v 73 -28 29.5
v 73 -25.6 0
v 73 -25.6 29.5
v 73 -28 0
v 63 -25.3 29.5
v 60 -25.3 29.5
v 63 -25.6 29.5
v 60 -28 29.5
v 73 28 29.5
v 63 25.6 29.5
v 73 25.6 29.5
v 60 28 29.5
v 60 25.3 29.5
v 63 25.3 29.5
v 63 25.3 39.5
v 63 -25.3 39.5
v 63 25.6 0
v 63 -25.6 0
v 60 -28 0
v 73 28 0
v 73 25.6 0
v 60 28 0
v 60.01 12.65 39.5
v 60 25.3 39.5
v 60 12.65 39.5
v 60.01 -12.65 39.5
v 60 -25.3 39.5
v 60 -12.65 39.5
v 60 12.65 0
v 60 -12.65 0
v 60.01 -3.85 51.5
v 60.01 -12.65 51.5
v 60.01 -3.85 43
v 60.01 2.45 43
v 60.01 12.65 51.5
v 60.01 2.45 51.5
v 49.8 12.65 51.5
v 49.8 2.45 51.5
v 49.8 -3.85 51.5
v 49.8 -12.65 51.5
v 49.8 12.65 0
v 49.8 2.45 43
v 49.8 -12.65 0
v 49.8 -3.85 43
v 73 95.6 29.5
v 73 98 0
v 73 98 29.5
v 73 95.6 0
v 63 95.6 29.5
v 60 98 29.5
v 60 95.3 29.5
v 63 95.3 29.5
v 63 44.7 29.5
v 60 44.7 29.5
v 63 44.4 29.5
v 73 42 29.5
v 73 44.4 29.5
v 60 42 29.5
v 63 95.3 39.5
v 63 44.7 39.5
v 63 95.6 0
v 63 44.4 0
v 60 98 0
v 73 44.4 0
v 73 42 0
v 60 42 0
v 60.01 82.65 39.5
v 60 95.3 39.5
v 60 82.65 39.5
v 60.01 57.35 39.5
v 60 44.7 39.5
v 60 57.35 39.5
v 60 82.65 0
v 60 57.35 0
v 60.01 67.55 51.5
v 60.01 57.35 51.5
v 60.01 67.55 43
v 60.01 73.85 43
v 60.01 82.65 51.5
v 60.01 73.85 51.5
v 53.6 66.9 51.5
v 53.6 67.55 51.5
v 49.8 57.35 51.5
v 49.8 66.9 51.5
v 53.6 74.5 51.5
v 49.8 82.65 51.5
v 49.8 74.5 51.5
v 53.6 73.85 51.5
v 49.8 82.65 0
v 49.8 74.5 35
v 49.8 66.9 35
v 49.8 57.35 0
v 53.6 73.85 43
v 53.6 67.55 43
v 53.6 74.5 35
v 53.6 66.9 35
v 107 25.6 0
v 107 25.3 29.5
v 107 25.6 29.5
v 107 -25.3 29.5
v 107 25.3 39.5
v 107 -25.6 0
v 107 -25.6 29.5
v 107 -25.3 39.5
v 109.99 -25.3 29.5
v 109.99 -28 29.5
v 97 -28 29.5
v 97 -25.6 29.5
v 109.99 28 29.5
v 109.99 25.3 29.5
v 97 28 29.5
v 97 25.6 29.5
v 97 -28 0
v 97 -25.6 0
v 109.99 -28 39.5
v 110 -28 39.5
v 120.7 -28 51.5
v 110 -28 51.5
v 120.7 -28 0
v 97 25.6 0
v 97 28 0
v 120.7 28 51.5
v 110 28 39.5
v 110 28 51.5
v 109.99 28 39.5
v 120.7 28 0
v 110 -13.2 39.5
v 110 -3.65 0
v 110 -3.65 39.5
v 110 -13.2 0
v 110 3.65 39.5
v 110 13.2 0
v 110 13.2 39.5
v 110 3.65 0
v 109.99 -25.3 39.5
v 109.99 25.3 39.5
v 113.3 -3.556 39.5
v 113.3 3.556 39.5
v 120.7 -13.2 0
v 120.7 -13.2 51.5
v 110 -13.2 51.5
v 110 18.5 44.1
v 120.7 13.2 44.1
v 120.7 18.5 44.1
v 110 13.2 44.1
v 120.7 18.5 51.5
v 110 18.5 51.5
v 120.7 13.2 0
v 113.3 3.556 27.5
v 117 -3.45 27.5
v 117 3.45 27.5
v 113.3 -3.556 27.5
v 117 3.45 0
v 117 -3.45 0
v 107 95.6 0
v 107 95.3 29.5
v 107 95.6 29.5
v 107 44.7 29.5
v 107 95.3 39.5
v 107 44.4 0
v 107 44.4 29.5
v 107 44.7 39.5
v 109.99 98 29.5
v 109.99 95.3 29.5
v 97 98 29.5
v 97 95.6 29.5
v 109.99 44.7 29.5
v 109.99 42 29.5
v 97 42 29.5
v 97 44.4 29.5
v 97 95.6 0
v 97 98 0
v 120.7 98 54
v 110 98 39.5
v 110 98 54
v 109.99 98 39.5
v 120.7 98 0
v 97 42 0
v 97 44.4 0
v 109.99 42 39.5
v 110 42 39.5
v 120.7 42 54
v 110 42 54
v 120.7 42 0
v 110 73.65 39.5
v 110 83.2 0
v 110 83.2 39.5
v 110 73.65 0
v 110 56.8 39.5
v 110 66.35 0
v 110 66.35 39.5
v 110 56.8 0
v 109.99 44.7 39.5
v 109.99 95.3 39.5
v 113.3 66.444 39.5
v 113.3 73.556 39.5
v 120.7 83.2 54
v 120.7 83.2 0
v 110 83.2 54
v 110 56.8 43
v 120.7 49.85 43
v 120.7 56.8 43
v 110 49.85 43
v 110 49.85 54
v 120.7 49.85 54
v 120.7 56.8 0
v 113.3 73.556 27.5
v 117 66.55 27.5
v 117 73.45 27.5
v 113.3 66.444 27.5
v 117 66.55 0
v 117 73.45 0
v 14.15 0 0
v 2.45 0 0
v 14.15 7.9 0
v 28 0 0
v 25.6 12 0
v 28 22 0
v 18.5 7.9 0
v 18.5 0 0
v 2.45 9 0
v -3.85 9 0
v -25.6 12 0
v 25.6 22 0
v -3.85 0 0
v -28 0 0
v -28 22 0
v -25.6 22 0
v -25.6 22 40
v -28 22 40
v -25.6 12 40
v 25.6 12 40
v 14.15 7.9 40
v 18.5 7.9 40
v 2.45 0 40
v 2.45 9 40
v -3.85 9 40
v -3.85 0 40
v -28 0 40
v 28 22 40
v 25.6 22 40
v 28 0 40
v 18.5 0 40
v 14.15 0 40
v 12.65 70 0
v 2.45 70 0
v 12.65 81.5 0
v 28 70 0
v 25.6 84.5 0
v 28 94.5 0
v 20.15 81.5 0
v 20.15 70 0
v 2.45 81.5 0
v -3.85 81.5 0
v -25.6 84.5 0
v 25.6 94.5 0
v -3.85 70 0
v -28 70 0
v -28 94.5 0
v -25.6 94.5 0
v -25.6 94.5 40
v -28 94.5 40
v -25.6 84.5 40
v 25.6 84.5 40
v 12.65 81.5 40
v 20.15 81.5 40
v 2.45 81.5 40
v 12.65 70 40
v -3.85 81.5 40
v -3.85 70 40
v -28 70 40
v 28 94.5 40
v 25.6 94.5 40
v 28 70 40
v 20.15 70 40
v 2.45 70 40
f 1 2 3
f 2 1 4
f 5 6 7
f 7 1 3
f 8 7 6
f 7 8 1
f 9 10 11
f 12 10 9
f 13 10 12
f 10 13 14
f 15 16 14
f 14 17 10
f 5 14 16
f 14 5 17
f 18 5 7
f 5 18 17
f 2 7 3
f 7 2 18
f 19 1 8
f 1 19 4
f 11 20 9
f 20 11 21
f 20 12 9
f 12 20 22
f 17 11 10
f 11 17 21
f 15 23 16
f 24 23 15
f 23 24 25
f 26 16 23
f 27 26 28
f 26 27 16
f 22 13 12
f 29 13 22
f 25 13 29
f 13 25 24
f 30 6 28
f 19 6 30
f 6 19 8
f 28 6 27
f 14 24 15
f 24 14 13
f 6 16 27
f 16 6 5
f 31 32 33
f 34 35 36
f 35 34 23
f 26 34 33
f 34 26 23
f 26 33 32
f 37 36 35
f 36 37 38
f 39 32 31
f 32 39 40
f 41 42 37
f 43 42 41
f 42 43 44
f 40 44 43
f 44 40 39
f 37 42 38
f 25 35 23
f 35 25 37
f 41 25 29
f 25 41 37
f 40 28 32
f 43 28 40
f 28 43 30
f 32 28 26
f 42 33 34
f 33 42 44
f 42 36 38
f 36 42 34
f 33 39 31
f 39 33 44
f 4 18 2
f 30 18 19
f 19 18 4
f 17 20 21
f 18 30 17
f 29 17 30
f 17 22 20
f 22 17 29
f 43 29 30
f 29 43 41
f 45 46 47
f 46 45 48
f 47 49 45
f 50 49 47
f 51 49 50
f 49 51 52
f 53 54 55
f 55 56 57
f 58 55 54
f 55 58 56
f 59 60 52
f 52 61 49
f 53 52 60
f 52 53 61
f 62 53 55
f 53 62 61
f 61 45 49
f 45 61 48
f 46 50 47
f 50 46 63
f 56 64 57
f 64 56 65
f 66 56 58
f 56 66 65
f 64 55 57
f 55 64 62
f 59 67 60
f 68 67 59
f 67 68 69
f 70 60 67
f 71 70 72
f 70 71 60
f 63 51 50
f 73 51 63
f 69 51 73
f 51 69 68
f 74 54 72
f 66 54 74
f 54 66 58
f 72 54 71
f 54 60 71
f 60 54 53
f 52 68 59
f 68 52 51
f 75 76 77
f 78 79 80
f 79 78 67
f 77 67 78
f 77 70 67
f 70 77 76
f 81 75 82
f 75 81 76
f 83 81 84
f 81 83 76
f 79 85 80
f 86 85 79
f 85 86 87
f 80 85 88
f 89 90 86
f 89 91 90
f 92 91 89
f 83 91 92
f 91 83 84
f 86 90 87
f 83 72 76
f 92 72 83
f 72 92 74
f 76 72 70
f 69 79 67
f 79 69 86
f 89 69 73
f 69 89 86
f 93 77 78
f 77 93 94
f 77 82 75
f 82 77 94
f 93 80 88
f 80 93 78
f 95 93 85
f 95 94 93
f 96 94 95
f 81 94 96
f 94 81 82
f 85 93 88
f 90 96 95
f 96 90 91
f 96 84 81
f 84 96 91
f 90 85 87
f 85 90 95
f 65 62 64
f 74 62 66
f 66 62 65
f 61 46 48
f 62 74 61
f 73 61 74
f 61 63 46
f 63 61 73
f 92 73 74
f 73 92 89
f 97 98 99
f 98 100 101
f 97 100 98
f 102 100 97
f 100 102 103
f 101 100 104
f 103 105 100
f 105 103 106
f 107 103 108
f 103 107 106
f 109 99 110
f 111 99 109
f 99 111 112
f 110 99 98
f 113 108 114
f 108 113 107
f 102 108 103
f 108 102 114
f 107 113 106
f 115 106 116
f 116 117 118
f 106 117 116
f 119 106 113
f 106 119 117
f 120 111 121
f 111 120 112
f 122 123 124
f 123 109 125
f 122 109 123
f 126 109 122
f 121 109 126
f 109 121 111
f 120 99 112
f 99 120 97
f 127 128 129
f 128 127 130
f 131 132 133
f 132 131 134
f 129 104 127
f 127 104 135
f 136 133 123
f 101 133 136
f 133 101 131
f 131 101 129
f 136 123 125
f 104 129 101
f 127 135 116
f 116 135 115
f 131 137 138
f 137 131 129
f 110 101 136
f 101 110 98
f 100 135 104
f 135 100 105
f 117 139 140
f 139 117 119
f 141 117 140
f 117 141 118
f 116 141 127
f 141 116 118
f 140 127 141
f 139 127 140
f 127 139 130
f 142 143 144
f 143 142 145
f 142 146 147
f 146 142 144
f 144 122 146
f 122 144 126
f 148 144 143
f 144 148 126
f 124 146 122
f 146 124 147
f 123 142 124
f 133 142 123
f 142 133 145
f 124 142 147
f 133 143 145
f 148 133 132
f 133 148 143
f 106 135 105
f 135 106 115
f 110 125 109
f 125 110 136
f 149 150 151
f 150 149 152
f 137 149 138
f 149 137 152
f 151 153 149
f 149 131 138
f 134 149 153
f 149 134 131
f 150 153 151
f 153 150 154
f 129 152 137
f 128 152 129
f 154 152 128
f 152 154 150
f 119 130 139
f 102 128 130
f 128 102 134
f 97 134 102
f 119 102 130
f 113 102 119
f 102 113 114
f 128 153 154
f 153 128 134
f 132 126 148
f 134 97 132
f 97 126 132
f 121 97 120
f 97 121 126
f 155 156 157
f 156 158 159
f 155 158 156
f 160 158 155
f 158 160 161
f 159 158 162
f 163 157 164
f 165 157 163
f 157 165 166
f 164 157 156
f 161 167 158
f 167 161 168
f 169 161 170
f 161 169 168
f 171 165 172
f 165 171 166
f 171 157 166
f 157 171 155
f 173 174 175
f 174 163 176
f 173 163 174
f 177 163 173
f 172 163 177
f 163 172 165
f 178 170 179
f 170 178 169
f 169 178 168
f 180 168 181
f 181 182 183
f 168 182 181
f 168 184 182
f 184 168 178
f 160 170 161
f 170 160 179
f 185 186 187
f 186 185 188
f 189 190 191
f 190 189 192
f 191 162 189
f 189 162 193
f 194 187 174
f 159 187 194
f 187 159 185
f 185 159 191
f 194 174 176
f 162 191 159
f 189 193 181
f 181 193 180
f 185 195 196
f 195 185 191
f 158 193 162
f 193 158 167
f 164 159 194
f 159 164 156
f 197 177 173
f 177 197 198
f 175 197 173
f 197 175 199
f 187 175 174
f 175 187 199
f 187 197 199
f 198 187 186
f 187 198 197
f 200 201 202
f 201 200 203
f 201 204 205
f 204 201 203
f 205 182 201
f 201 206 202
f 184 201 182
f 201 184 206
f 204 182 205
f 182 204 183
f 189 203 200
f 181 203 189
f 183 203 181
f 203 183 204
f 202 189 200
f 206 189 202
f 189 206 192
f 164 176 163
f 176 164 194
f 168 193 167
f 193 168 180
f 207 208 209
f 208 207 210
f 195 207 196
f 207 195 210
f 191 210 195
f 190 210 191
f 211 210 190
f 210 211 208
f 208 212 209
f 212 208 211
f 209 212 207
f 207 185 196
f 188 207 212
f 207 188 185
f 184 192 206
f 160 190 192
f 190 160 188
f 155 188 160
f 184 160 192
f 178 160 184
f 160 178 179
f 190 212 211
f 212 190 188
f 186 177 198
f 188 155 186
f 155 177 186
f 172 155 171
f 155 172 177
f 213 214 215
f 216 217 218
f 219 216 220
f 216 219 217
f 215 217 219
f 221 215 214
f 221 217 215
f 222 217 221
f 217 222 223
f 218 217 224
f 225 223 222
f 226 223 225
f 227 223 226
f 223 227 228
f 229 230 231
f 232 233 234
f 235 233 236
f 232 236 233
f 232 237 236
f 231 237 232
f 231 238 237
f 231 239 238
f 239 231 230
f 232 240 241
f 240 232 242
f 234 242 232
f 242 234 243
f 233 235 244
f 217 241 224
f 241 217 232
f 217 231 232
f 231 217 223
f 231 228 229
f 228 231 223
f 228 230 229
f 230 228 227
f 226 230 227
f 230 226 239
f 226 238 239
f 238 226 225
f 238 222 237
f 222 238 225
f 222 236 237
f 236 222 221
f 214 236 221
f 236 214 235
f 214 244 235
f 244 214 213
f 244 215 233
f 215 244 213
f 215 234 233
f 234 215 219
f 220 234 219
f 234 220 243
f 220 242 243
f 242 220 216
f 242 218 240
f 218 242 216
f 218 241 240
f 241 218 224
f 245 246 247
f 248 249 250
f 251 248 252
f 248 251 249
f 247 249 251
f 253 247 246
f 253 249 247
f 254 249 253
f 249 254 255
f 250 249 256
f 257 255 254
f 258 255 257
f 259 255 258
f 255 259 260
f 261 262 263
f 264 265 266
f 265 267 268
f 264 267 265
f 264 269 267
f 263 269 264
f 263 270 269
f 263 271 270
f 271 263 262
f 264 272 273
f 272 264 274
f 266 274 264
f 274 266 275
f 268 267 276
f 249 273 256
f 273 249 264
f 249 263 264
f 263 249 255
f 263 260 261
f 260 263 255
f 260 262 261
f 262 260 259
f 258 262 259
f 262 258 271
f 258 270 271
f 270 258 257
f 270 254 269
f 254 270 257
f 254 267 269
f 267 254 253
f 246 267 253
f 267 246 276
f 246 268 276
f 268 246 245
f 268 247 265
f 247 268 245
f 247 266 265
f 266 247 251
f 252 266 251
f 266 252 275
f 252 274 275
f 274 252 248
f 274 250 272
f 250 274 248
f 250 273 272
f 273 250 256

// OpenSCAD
// =====================================================================
//  Window vent: printed edge caps around the foam insert (fit tests)
//  Parametric OpenSCAD model (tested with OpenSCAD 2021.01).
//
//  * The foam insert (XPS, 2 in thick, 100 mm wide) fills the gap
//    between the sliding sash and the window's side frame. Printed caps
//    on its four edges fit the window's profiles, so the foam itself
//    stays a plain rectangle:
//      - top:    over the top frame's two ribs;
//      - bottom: over the bottom track's two rails;
//      - side:   a tongue into the side frame's sash channel;
//      - sash:   a channel that takes the sash's end, as the side frame
//                does, with a tongue in the sash's end groove.
//  * This first step prints a thin slice of each profile, to check the
//    profiles and the clearance before printing whole caps. The second
//    prints the cap ends that meet in the four corners.
//  * Installation, like a drawer: open the sash wide; push the side cap
//    into the side frame's channel; set the bottom and top caps on their
//    rails and ribs a little away from the side frame and slide them
//    against it; slide the foam in sideways, between their lips, into
//    the side cap; put the sash cap on the foam's other edge; close the
//    sash against it. Nothing is glued: reverse it in spring.
//  * The top and bottom caps run the whole width, from the side frame's
//    face to the sash's end. The side and sash caps fit between them,
//    and the top and bottom caps' lips straddle their ends. The side
//    cap's tongue goes on into the channel up to the ceiling and down to
//    the floor, notched for the centre rib and rail (they run through
//    the channel to its back wall) and for the soft foam strip there.
//
//  Slices: x across the foam's thickness (u, from its centre, outdoor
//  negative), y from the window's reference surface toward the foam
//  (the ceiling, the track floor, the side frame's face or the sash's
//  end face), z through the slice. The window's features are at y < 0
//  for the side and the sash, and cut into the slice from y = 0 for the
//  top and the bottom.
//
//  Caps, installed: x across the window (x = 0 on the side frame's face,
//  toward the sash), y = u, z up (z = 0 on the track's floor).
//
//  Each slice ends in a tab exactly as wide as the foam: its edges show
//  where the foam's faces are, and the engraved line across it shows
//  where the foam starts. The tabs carry a cross-lap key: in a corner, a
//  top or bottom slice and a side or sash slice slot together (sliding
//  along u until both slots bottom out), so their u positions must
//  match for the pair to sit in the corner.
// =====================================================================

/* [Part to show or export] */
part = "corners";   // [corners, corner_top, corner_bottom, corner_side_top, corner_side_bottom, corner_sash_top, corner_sash_bottom, corners_view, slices, slice_top, slice_bottom, slice_side, slice_sash, slice_pair_view]

/* [Fit] */
clr      = 0.3;     // clearance per side on the window's ribs, channel and sash
clr_d    = 0.5;     // clearance at the bottom of a slot or channel (depth)
slice_t  = 5;       // slice thickness
base     = 3;       // cap material between the deepest window feature and the foam

cap_gap  = 0.5;     // between a cap's end and the cap it butts against (foam tape)
foam_clr = 0.2;     // per side, between the foam and the lips (it slides in)

/* [Foam] */
foam_t   = 50.8;    // foam thickness (2 in)
foam_w   = 100;     // foam width, side frame to sash

/* [Caps] */
lip_d    = 10;      // how far the lips reach onto the foam's faces
lip_t    = 2.4;     // lip thickness
corner_l = 40;      // corner test pieces: length past the cap they butt against

/* [Window (measured)] */
H        = 1079.5;  // ceiling to floor: 1060.0 from the centre rib's tip to the centre rail's tip, + 8.50 + 11.00
// u positions are measured from the foam's centre: the centre of the 25.90 sash channel. The first rib of each
// list is the centre one (the sash rides it; it runs through the side frame's channel to its back wall)
top_ribs = [[-3.55, 2.15, 8.50], [14.45, 18.20, 7.40]];    // [u from, u to, depth below the ceiling]; the third rib
                                                           //   (-39.85 to -34.55) is outside the foam. The room-side
                                                           //   rib is 1.5 mm further toward the room than the bottom
                                                           //   track's (measured twice)
bot_ribs = [[-3.55, 2.15, 11.00], [12.95, 19.85, 11.00]];  // [u from, u to, height above the floor]; the tall
                                                           //   outdoor lip (-39.50 to -33.80) is outside the foam
side_ch  = [25.90, 10.70];  // side frame's sash channel: width (centred), depth
strip    = [-4.20, 2.80, 19.0, 4.0];   // soft foam strip around the centre rail's end, at the back of the channel:
                    //   u from, u to, height, depth from the back wall
floor_strip = 2.5;  // the tongue stops this much higher, over another soft strip on the channel's floor
                    //   (1.7 thick, 4.0 deep from the back wall, across the channel)
sash_t   = 25.80;   // sash thickness at its end (centred)
sash_in  = 10.70;   // how far the sash goes into its cap (17.10 max: there the sash widens)
groove   = [7.90, 7.50, 7.50];   // sash end groove: width at the mouth, width at the bottom, depth
groove_key = true;  // tongue in the sash's end groove (one more seal line)
screw    = [3.70, 12];   // screw heads in the groove at the sash's top and bottom: height above the groove's bottom,
                         //   length of the tongue's relief from each of its ends

/* [Key] */
key_at   = 25;      // key position from the window's reference surface (clear of the deepest cap)
key_clr  = 0.15;    // clearance per side in the key slots
key_tail = 4;       // tab material past the key slot

eps   = 0.01;
key_w = slice_t + 2 * key_clr;
tab_y = key_at + key_w / 2 + key_tail;   // tab end

// foam line: cap thickness from the reference surface to the foam
function deepest(r) = max([for (i = r) i[2]]);
function cap_t(kind) =
    kind == "top"    ? deepest(top_ribs) + clr_d + base :
    kind == "bottom" ? deepest(bot_ribs) + clr_d + base : base;

// the slice's outline, 2D
module profile(kind) {
    w = foam_t;
    if (kind == "top" || kind == "bottom")
        difference() {
            translate([-w / 2, 0]) square([w, tab_y]);
            for (r = kind == "top" ? top_ribs : bot_ribs)
                translate([r[0] - clr, -1]) square([r[1] - r[0] + 2 * clr, r[2] + clr_d + 1]);
        }
    if (kind == "side")
        union() {
            translate([-w / 2, 0]) square([w, tab_y]);
            translate([-side_ch[0] / 2 + clr, -(side_ch[1] - clr_d)]) square([side_ch[0] - 2 * clr, side_ch[1] - clr_d + eps]);
        }
    if (kind == "sash")
        union() {
            translate([-w / 2, 0]) square([w, tab_y]);
            for (s = [-1, 1])   // the channel's walls, along the sash's faces
                translate([s < 0 ? -w / 2 : sash_t / 2 + clr, -sash_in]) square([w / 2 - sash_t / 2 - clr, sash_in + eps]);
            if (groove_key) {   // tongue in the groove, tapered like it
                m = groove[0] / 2 - clr;
                b = groove[1] / 2 - clr;
                d = groove[2] - clr_d;
                polygon([[-m, eps], [m, eps], [b, -d], [-b, -d]]);
            }
        }
}

module label(t, size = 4) text(t, size = size, font = "Liberation Sans:style=Bold", halign = "center", valign = "center");

// one slice, on the bed
module slice(kind) {
    w  = foam_t;
    t  = cap_t(kind);
    tb = kind == "top" || kind == "bottom";
    name = kind == "top" ? "TOP" : kind == "bottom" ? "BOT" : kind == "side" ? "SIDE" : "SASH";
    difference() {
        linear_extrude(slice_t) profile(kind);
        // key slot: from the outdoor edge on the top and bottom slices, from the room edge on the side and sash ones
        translate([tb ? -w / 2 - 1 : 0, key_at - key_w / 2, -1]) cube([w / 2 + 1, key_w, slice_t + 2]);
        // foam line: an engraved line across, and a notch in each edge
        translate([-w / 2 - 1, t - 0.3, slice_t - 0.4]) cube([w + 2, 0.6, 1]);
        for (s = [-1, 1]) translate([s * w / 2, t, -1]) rotate(45) translate([-0.8, -0.8, 0]) cube([1.6, 1.6, slice_t + 2]);
        // foam centre line, on the tab
        translate([-0.3, t, slice_t - 0.4]) cube([0.6, tab_y - t + 1, 1]);
        // labels, between the foam line and the key slot
        ly = (t + key_at - key_w / 2) / 2;
        translate([-w / 4 - 2, ly, slice_t - 0.6]) linear_extrude(1) label("OUT");
        translate([w / 4 + 1, ly, slice_t - 0.6]) linear_extrude(1) label(name);
    }
}

// all four slices, laid out for one print
module slices() {
    for (k = [["top", 0, 0], ["bottom", 1, 0], ["side", 0, 1], ["sash", 1, 1]])
        translate([k[1] * (foam_t + 8), k[2] * (tab_y + sash_in + 8) + (k[0] == "side" || k[0] == "sash" ? sash_in : 0), 0])
            slice(k[0]);
}

// a keyed pair in its corner: top slice and side slice, installed coordinates (x across the window toward the foam,
// y = u toward the room, z up; the ceiling at z = 0, the side frame's face at x = 0). The window is a rough ghost.
module slice_pair_view() {
    color([0.95, 0.6, 0.25])   // slice u -> y, depth below the ceiling -> -z, thickness -> -x
        multmatrix([[0, 0, -1, key_at + slice_t / 2], [1, 0, 0, 0], [0, -1, 0, 0], [0, 0, 0, 1]]) slice("top");
    color([0.4, 0.6, 0.9])     // slice u -> y, distance from the frame's face -> x, thickness -> -z
        multmatrix([[0, 1, 0, 0], [1, 0, 0, 0], [0, 0, -1, -key_at + slice_t / 2], [0, 0, 0, 1]]) slice("side");
    %union() {
        translate([-side_ch[1] - 8, -45, 0]) cube([side_ch[1] + 8 + 70, 90, 6]);   // top frame
        for (r = top_ribs) translate([0, r[0], -r[2]]) cube([70, r[1] - r[0], r[2] + eps]);
        difference() {   // side frame, with its sash channel
            translate([-side_ch[1] - 8, -45, -70]) cube([side_ch[1] + 8, 90, 70]);
            translate([-side_ch[1], -side_ch[0] / 2, -71]) cube([side_ch[1] + 1, side_ch[0], 72]);
        }
    }
}

/* =================== CAPS (installed coordinates) =================== */
fw = foam_t / 2 + foam_clr;     // half width inside the lips
ow = fw + lip_t;                // half width over the lips
xs = base + foam_w + base;      // the sash's end face
zt = H - cap_t("top");          // underside of the top cap's body
zb = cap_t("bottom");           // top of the bottom cap's body

// top or bottom cap's cross-section: X = u, Y = from the ceiling or floor toward the foam
module cap_section(kind) {
    t = cap_t(kind);
    difference() {
        translate([-ow, 0]) square([2 * ow, t]);
        for (r = kind == "top" ? top_ribs : bot_ribs)
            translate([r[0] - clr, -1]) square([r[1] - r[0] + 2 * clr, r[2] + clr_d + 1]);
    }
    for (s = [-1, 1]) translate([s < 0 ? -ow : fw, t - eps]) square([lip_t, lip_d + eps]);
}

module top_cap(x0 = 0, x1 = xs) {
    multmatrix([[0, 0, 1, x0], [1, 0, 0, 0], [0, -1, 0, H], [0, 0, 0, 1]]) linear_extrude(x1 - x0) cap_section("top");
}

module bottom_cap(x0 = 0, x1 = xs) {
    multmatrix([[0, 0, 1, x0], [1, 0, 0, 0], [0, 1, 0, 0], [0, 0, 0, 1]]) linear_extrude(x1 - x0) cap_section("bottom");
}

// the side and sash caps' bodies and lips, between the top and bottom caps (and under their lips)
// (the base is the foam's width at its ends, where those lips straddle it, and the lips' width between them)
module upright_body(xb0, xl0) {
    translate([xb0, -fw + clr, zb + cap_gap]) cube([base, 2 * (fw - clr), zt - zb - 2 * cap_gap]);
    z0 = zb + lip_d + cap_gap;
    h  = zt - zb - 2 * (lip_d + cap_gap);
    translate([xb0, -ow, z0]) cube([base, 2 * ow, h]);
    for (s = [-1, 1])
        translate([xl0, s < 0 ? -ow : fw, z0]) cube([lip_d, lip_t, h]);
}

module side_cap() {
    upright_body(0, base);
    tw = side_ch[0] / 2 - clr;
    td = side_ch[1] - clr_d;
    difference() {   // tongue, floor to ceiling in the channel
        translate([-td, -tw, clr_d + floor_strip]) cube([td + eps, 2 * tw, H - 2 * clr_d - floor_strip]);
        r = top_ribs[0];
        translate([-td - 1, r[0] - clr, H - r[2] - clr_d]) cube([td + 2, r[1] - r[0] + 2 * clr, r[2] + clr_d + 1]);
        b = bot_ribs[0];
        translate([-td - 1, b[0] - clr, -1]) cube([td + 2, b[1] - b[0] + 2 * clr, b[2] + clr_d + 1]);
        translate([-side_ch[1] - 1, strip[0] - clr, -1]) cube([strip[3] + clr + 1, strip[1] - strip[0] + 2 * clr, strip[2] + clr_d + 1]);
    }
}

module sash_cap() {
    upright_body(xs - base, xs - base - lip_d);
    z0 = zb + cap_gap;
    h  = zt - zb - 2 * cap_gap;
    wi = sash_t / 2 + clr;   // the walls' inner face (|u|)
    for (s = [-1, 1]) {   // the channel's walls, along the sash's faces
        translate([xs - eps, s < 0 ? -ow : wi, z0]) cube([sash_in + eps, ow - wi, h]);
        // past the sash's end face they go on to the ceiling and the floor, notched for the ribs and rails beside
        // the sash (a notch runs to the sash's face when it would leave a sliver thinner than 1.5 mm)
        difference() {
            translate([xs, s < 0 ? -ow : wi, clr_d]) cube([sash_in, ow - wi, H - 2 * clr_d]);
            for (k = [[top_ribs, H, -1], [bot_ribs, 0, 1]], r = k[0])
                let(a = r[0] - clr, b = r[1] + clr)
                if (s * b > wi && s * a < ow)
                    let(lo = s > 0 && a - wi < 1.5 ? wi - 1 : a,
                        hi = s < 0 && -wi - b < 1.5 ? -wi + 1 : b,
                        d  = r[2] + clr_d)
                    translate([xs - 1, lo, k[2] > 0 ? -1 : H - d]) cube([sash_in + 2, hi - lo, d + 1]);
        }
    }
    if (groove_key) {   // tongue in the groove, tapered like it
        m = groove[0] / 2 - clr;
        b = groove[1] / 2 - clr;
        d = groove[2] - clr_d;
        difference() {
            translate([xs, 0, z0]) linear_extrude(h) polygon([[-eps, -m], [-eps, m], [d, b], [d, -b]]);
            for (zr = [z0 - 1, z0 + h - screw[1]])   // shallower over the screw heads near its ends
                translate([xs + groove[2] - screw[0] - clr_d, -groove[0], zr]) cube([screw[0] + 1, 2 * groove[0], screw[1] + 1]);
        }
    }
}

// the window around the caps, roughly (a ghost for the views)
module window_ghost() {
    x0 = -side_ch[1] - 8;
    x1 = xs + 40;
    translate([x0, -45, H]) cube([x1 - x0, 90, 6]);   // top frame and its ribs
    for (r = top_ribs) let(a = r == top_ribs[0] ? -side_ch[1] : 0) translate([a, r[0], H - r[2]]) cube([x1 - a, r[1] - r[0], r[2] + eps]);
    translate([x0, -45, -6]) cube([x1 - x0, 90, 6]);  // bottom frame and its rails
    for (r = bot_ribs) let(a = r == bot_ribs[0] ? -side_ch[1] : 0) translate([a, r[0], -eps]) cube([x1 - a, r[1] - r[0], r[2] + eps]);
    translate([-side_ch[1], strip[0], 0]) cube([strip[3], strip[1] - strip[0], strip[2]]);
    difference() {   // side frame, with its channel
        translate([x0, -45, 0]) cube([8 + side_ch[1], 90, H]);
        translate([-side_ch[1], -side_ch[0] / 2, -1]) cube([side_ch[1] + 1, side_ch[0], H + 2]);
    }
    difference() {   // the sash's end, with its groove
        translate([xs, -sash_t / 2, 0]) cube([40, sash_t, H]);
        translate([xs - 1, -groove[1] / 2, -1]) cube([groove[2] + 1, groove[1], H + 2]);
    }
}

/* =================== CORNER TEST PIECES =================== */
// The real cap ends, in their print orientation (all print standing, cross-section on the bed). One top piece and
// one bottom piece serve both corners: turn them end for end for the sash corners.
module corner_top()    linear_extrude(corner_l) cap_section("top");
module corner_bottom() linear_extrude(corner_l) cap_section("bottom");

// upright ends: top ends stand on their cut face, bottom ends are turned over onto it
module upright_top(sash) {
    translate([0, 0, -(zt - corner_l)]) intersection() {
        if (sash) sash_cap(); else side_cap();
        translate([-50, -50, zt - corner_l]) cube([xs + 100, 100, H]);
    }
}
module upright_bottom(sash) {
    translate([0, 0, zb + corner_l]) rotate([180, 0, 0]) intersection() {
        if (sash) sash_cap(); else side_cap();
        translate([-50, -50, -1]) cube([xs + 100, 100, zb + corner_l + 1]);
    }
}
module corner_side_top()    upright_top(false);
module corner_side_bottom() upright_bottom(false);
module corner_sash_top()    translate([-xs, 0, 0]) upright_top(true);
module corner_sash_bottom() translate([-xs, 0, 0]) upright_bottom(true);

// all six on one plate (print two top and two bottom pieces to try all four corners at once)
module corners() {
    translate([0, 0, 0])     corner_top();
    translate([0, 70, 0])    corner_bottom();
    translate([60, 0, 0])    corner_side_top();
    translate([60, 70, 0])   corner_side_bottom();
    translate([110, 0, 0])   corner_sash_top();
    translate([110, 70, 0])  corner_sash_bottom();
}

// the pieces in their corners, in the window (preview with a small H, for example -D H=200)
module corners_view() {
    color([0.95, 0.6, 0.25]) { top_cap(0, corner_l); top_cap(xs - corner_l, xs); }
    color([0.9, 0.75, 0.3])  { bottom_cap(0, corner_l); bottom_cap(xs - corner_l, xs); }
    color([0.4, 0.6, 0.9])   intersection() { side_cap(); union() { translate([-50, -50, zt - corner_l]) cube([100, 100, 100]); translate([-50, -50, -1]) cube([100, 100, zb + corner_l + 1]); } }
    color([0.5, 0.8, 0.6])   intersection() { sash_cap(); union() { translate([xs - 50, -50, zt - corner_l]) cube([100, 100, 100]); translate([xs - 50, -50, -1]) cube([100, 100, zb + corner_l + 1]); } }
    %window_ghost();
}

if (part == "corners")            corners();
if (part == "corner_top")         corner_top();
if (part == "corner_bottom")      corner_bottom();
if (part == "corner_side_top")    corner_side_top();
if (part == "corner_side_bottom") corner_side_bottom();
if (part == "corner_sash_top")    corner_sash_top();
if (part == "corner_sash_bottom") corner_sash_bottom();
if (part == "corners_view")       corners_view();
if (part == "slices")             slices();
if (part == "slice_top")          slice("top");
if (part == "slice_bottom")       slice("bottom");
if (part == "slice_side")         slice("side");
if (part == "slice_sash")         slice("sash");
if (part == "slice_pair_view")    slice_pair_view();
